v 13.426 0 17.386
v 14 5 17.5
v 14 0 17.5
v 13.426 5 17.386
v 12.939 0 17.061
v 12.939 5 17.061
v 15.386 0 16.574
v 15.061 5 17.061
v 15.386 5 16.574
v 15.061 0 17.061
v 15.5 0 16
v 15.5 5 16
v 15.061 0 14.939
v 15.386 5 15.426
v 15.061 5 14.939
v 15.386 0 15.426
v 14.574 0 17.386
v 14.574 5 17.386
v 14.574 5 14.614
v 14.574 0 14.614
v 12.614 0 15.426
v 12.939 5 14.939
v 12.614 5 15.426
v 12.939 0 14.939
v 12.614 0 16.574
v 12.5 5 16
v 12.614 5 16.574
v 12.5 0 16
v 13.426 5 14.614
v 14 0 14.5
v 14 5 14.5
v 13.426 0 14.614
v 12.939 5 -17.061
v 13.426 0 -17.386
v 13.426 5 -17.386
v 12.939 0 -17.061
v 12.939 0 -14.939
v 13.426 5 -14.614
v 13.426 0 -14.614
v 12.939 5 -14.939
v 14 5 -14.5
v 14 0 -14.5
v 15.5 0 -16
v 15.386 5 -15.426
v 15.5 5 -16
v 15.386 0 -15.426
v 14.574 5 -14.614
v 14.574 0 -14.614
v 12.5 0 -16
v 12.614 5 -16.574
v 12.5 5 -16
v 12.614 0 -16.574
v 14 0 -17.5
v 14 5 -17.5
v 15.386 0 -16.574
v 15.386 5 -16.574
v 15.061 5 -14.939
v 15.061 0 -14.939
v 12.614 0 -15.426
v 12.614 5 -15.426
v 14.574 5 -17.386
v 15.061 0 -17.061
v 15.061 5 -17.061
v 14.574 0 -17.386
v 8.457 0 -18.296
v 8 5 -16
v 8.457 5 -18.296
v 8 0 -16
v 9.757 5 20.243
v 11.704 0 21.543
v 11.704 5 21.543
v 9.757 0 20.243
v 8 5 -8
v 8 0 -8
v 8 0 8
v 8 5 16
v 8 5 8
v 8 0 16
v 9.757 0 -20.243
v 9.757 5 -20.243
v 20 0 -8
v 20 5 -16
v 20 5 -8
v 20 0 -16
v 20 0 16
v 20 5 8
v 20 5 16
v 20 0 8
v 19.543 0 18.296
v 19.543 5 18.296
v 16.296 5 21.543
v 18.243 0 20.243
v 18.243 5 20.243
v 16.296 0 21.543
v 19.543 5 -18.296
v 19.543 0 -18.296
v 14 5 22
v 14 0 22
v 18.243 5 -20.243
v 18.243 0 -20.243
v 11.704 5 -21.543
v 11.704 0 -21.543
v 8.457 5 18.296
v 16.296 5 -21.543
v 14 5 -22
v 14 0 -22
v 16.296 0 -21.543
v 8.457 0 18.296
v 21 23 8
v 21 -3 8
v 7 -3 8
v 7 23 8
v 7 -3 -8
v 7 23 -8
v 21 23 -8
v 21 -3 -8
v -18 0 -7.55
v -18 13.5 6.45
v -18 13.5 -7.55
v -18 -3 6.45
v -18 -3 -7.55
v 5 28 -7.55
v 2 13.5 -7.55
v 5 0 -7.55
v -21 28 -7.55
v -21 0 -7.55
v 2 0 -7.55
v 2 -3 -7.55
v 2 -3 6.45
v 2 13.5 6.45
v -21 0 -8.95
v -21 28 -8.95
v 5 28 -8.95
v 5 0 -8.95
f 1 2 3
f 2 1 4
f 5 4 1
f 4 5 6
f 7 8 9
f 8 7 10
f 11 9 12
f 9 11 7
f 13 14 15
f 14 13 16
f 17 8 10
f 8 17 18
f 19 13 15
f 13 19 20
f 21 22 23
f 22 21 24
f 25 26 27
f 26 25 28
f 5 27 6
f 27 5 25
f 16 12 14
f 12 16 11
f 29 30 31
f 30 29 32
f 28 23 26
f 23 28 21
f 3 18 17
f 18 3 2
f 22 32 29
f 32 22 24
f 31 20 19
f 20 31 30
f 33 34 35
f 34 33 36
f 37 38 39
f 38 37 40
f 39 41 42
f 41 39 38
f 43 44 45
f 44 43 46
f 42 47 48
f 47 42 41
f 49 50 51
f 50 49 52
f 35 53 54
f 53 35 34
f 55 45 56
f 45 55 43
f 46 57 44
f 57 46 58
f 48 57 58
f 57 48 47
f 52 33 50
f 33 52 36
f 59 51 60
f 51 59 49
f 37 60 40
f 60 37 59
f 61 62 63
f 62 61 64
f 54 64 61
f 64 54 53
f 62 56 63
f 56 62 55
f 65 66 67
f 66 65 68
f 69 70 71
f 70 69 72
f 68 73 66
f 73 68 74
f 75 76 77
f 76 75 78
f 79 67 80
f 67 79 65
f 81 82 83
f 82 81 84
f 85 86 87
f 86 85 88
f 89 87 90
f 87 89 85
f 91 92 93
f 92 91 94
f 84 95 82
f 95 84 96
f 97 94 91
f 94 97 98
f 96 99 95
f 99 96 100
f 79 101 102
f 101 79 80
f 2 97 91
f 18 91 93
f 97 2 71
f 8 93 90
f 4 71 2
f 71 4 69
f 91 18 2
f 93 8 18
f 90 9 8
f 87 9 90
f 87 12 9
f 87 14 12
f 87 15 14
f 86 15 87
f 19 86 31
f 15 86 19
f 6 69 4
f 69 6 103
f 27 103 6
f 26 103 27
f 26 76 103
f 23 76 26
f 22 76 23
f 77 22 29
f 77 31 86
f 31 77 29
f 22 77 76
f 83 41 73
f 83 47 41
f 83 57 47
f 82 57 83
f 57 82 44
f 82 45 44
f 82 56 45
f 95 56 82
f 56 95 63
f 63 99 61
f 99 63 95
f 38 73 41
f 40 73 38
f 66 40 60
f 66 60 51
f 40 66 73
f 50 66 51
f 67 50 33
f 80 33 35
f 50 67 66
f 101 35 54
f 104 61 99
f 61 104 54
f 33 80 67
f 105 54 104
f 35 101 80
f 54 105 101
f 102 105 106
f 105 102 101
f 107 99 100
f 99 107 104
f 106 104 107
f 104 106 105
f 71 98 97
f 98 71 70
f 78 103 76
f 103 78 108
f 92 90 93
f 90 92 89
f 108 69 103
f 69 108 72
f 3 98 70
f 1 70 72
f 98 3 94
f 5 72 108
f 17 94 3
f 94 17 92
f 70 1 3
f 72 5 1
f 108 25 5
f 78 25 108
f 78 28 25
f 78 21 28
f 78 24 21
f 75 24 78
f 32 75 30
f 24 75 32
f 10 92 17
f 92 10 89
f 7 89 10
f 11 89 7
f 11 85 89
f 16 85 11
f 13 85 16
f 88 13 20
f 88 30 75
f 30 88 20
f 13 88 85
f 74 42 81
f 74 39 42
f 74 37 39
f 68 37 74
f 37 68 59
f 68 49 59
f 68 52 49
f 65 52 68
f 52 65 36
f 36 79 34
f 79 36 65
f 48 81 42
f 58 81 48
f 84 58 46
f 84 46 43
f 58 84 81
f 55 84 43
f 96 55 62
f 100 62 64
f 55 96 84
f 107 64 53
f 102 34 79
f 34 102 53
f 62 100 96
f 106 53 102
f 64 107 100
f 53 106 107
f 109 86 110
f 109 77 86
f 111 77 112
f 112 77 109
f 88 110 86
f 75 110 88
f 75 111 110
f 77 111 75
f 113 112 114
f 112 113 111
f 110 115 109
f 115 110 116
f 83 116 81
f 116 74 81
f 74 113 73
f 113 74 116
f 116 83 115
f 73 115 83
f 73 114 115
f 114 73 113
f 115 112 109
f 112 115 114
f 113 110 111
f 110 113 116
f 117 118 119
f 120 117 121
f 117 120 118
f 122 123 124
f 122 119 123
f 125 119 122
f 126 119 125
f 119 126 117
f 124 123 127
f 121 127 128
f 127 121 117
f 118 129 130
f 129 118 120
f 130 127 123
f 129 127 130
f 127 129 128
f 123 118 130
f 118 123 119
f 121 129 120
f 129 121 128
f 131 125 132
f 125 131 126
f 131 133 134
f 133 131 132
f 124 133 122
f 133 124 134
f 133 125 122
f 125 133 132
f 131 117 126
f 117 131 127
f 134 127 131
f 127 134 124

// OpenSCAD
tolerance=0.4;
//loligagger mount
/*
translate([0,0,-12.5/2])union(){
cube([28.75,4.55,12.5], center=true);
translate([0,((4.55-2)/2 - 4.55),-4/2])cube([36.75,2,16.5],center=true);
}
*/


//usb b
translate([14,0,0])rotate([0,180,0])union(){
    rotate([0,90,0])union(){
        translate([0,26/2-3,0])cube([16,26,14],center=true);

        difference(){
            hull(){
                translate([16,5,0])rotate([90])cylinder(d=12, h=5, $fn=16);
                translate([-16,5,0])rotate([90])cylinder(d=12, h=5, $fn=16);
            }
            union(){
                translate([16,10,0])rotate([90])cylinder(d=3, h=20, $fn=16);
                translate([-16,10,0])rotate([90])cylinder(d=3, h=20, $fn=16);
            }
        }
    }

//rj45
    translate([22,28/2,16.5/2])union(){
        translate([0,-28/2+16.5/2-3, - 14/2 - 1.4/2])cube([20,16.5,14], center=true);
        cube([26, 28, 1.4], center=true);
    }
}




/*
union(){
    difference(){
        //plate
        translate([0,-2,0])cube([50,2,40],center=true);

        //holes
        translate([14,0,0])rotate([0,180,0])union(){
            rotate([0,90,0])union(){
                translate([16,10,0])rotate([90])cylinder(d=3+tolerance, h=20, $fn=16);
                translate([-16,10,0])rotate([90])cylinder(d=3+tolerance, h=20, $fn=16);
            }

            rotate([0,180,0])union(){
                rotate([0,90,0])union(){
                    translate([0,26/2-3-1,0])cube([16+tolerance,26,14+tolerance],center=true);
                }
            }

            translate([22,28/2,16.5/2])union(){
                translate([0,-28/2+16.5/2-3-1, - 14/2 - 1.4/2])cube([20+tolerance,16.5,14+tolerance], center=true);
            }
        }
    }
    //clips
    translate([14,0,0])rotate([0,180,0])translate([22,28/2,16.5/2])union(){
        difference(){
            union(){
                translate([22/2+3/2,-28/2+1,0])cube([4,4,3],center=true);
                translate([-22/2-3/2,-28/2+1,0])cube([4,4,3],center=true);
            }
            cube([26+tolerance, 28, 1.4+tolerance], center=true);
        }
        difference(){
            translate([0,-16.5/2+1,-14])cube([20+3,16.5,5],center=true);
            translate([0,-28/2+16.5/2-3, - 14/2 - 1.4/2])cube([20+tolerance,16.5+tolerance,14], center=true);
        }
    }
}
*/
